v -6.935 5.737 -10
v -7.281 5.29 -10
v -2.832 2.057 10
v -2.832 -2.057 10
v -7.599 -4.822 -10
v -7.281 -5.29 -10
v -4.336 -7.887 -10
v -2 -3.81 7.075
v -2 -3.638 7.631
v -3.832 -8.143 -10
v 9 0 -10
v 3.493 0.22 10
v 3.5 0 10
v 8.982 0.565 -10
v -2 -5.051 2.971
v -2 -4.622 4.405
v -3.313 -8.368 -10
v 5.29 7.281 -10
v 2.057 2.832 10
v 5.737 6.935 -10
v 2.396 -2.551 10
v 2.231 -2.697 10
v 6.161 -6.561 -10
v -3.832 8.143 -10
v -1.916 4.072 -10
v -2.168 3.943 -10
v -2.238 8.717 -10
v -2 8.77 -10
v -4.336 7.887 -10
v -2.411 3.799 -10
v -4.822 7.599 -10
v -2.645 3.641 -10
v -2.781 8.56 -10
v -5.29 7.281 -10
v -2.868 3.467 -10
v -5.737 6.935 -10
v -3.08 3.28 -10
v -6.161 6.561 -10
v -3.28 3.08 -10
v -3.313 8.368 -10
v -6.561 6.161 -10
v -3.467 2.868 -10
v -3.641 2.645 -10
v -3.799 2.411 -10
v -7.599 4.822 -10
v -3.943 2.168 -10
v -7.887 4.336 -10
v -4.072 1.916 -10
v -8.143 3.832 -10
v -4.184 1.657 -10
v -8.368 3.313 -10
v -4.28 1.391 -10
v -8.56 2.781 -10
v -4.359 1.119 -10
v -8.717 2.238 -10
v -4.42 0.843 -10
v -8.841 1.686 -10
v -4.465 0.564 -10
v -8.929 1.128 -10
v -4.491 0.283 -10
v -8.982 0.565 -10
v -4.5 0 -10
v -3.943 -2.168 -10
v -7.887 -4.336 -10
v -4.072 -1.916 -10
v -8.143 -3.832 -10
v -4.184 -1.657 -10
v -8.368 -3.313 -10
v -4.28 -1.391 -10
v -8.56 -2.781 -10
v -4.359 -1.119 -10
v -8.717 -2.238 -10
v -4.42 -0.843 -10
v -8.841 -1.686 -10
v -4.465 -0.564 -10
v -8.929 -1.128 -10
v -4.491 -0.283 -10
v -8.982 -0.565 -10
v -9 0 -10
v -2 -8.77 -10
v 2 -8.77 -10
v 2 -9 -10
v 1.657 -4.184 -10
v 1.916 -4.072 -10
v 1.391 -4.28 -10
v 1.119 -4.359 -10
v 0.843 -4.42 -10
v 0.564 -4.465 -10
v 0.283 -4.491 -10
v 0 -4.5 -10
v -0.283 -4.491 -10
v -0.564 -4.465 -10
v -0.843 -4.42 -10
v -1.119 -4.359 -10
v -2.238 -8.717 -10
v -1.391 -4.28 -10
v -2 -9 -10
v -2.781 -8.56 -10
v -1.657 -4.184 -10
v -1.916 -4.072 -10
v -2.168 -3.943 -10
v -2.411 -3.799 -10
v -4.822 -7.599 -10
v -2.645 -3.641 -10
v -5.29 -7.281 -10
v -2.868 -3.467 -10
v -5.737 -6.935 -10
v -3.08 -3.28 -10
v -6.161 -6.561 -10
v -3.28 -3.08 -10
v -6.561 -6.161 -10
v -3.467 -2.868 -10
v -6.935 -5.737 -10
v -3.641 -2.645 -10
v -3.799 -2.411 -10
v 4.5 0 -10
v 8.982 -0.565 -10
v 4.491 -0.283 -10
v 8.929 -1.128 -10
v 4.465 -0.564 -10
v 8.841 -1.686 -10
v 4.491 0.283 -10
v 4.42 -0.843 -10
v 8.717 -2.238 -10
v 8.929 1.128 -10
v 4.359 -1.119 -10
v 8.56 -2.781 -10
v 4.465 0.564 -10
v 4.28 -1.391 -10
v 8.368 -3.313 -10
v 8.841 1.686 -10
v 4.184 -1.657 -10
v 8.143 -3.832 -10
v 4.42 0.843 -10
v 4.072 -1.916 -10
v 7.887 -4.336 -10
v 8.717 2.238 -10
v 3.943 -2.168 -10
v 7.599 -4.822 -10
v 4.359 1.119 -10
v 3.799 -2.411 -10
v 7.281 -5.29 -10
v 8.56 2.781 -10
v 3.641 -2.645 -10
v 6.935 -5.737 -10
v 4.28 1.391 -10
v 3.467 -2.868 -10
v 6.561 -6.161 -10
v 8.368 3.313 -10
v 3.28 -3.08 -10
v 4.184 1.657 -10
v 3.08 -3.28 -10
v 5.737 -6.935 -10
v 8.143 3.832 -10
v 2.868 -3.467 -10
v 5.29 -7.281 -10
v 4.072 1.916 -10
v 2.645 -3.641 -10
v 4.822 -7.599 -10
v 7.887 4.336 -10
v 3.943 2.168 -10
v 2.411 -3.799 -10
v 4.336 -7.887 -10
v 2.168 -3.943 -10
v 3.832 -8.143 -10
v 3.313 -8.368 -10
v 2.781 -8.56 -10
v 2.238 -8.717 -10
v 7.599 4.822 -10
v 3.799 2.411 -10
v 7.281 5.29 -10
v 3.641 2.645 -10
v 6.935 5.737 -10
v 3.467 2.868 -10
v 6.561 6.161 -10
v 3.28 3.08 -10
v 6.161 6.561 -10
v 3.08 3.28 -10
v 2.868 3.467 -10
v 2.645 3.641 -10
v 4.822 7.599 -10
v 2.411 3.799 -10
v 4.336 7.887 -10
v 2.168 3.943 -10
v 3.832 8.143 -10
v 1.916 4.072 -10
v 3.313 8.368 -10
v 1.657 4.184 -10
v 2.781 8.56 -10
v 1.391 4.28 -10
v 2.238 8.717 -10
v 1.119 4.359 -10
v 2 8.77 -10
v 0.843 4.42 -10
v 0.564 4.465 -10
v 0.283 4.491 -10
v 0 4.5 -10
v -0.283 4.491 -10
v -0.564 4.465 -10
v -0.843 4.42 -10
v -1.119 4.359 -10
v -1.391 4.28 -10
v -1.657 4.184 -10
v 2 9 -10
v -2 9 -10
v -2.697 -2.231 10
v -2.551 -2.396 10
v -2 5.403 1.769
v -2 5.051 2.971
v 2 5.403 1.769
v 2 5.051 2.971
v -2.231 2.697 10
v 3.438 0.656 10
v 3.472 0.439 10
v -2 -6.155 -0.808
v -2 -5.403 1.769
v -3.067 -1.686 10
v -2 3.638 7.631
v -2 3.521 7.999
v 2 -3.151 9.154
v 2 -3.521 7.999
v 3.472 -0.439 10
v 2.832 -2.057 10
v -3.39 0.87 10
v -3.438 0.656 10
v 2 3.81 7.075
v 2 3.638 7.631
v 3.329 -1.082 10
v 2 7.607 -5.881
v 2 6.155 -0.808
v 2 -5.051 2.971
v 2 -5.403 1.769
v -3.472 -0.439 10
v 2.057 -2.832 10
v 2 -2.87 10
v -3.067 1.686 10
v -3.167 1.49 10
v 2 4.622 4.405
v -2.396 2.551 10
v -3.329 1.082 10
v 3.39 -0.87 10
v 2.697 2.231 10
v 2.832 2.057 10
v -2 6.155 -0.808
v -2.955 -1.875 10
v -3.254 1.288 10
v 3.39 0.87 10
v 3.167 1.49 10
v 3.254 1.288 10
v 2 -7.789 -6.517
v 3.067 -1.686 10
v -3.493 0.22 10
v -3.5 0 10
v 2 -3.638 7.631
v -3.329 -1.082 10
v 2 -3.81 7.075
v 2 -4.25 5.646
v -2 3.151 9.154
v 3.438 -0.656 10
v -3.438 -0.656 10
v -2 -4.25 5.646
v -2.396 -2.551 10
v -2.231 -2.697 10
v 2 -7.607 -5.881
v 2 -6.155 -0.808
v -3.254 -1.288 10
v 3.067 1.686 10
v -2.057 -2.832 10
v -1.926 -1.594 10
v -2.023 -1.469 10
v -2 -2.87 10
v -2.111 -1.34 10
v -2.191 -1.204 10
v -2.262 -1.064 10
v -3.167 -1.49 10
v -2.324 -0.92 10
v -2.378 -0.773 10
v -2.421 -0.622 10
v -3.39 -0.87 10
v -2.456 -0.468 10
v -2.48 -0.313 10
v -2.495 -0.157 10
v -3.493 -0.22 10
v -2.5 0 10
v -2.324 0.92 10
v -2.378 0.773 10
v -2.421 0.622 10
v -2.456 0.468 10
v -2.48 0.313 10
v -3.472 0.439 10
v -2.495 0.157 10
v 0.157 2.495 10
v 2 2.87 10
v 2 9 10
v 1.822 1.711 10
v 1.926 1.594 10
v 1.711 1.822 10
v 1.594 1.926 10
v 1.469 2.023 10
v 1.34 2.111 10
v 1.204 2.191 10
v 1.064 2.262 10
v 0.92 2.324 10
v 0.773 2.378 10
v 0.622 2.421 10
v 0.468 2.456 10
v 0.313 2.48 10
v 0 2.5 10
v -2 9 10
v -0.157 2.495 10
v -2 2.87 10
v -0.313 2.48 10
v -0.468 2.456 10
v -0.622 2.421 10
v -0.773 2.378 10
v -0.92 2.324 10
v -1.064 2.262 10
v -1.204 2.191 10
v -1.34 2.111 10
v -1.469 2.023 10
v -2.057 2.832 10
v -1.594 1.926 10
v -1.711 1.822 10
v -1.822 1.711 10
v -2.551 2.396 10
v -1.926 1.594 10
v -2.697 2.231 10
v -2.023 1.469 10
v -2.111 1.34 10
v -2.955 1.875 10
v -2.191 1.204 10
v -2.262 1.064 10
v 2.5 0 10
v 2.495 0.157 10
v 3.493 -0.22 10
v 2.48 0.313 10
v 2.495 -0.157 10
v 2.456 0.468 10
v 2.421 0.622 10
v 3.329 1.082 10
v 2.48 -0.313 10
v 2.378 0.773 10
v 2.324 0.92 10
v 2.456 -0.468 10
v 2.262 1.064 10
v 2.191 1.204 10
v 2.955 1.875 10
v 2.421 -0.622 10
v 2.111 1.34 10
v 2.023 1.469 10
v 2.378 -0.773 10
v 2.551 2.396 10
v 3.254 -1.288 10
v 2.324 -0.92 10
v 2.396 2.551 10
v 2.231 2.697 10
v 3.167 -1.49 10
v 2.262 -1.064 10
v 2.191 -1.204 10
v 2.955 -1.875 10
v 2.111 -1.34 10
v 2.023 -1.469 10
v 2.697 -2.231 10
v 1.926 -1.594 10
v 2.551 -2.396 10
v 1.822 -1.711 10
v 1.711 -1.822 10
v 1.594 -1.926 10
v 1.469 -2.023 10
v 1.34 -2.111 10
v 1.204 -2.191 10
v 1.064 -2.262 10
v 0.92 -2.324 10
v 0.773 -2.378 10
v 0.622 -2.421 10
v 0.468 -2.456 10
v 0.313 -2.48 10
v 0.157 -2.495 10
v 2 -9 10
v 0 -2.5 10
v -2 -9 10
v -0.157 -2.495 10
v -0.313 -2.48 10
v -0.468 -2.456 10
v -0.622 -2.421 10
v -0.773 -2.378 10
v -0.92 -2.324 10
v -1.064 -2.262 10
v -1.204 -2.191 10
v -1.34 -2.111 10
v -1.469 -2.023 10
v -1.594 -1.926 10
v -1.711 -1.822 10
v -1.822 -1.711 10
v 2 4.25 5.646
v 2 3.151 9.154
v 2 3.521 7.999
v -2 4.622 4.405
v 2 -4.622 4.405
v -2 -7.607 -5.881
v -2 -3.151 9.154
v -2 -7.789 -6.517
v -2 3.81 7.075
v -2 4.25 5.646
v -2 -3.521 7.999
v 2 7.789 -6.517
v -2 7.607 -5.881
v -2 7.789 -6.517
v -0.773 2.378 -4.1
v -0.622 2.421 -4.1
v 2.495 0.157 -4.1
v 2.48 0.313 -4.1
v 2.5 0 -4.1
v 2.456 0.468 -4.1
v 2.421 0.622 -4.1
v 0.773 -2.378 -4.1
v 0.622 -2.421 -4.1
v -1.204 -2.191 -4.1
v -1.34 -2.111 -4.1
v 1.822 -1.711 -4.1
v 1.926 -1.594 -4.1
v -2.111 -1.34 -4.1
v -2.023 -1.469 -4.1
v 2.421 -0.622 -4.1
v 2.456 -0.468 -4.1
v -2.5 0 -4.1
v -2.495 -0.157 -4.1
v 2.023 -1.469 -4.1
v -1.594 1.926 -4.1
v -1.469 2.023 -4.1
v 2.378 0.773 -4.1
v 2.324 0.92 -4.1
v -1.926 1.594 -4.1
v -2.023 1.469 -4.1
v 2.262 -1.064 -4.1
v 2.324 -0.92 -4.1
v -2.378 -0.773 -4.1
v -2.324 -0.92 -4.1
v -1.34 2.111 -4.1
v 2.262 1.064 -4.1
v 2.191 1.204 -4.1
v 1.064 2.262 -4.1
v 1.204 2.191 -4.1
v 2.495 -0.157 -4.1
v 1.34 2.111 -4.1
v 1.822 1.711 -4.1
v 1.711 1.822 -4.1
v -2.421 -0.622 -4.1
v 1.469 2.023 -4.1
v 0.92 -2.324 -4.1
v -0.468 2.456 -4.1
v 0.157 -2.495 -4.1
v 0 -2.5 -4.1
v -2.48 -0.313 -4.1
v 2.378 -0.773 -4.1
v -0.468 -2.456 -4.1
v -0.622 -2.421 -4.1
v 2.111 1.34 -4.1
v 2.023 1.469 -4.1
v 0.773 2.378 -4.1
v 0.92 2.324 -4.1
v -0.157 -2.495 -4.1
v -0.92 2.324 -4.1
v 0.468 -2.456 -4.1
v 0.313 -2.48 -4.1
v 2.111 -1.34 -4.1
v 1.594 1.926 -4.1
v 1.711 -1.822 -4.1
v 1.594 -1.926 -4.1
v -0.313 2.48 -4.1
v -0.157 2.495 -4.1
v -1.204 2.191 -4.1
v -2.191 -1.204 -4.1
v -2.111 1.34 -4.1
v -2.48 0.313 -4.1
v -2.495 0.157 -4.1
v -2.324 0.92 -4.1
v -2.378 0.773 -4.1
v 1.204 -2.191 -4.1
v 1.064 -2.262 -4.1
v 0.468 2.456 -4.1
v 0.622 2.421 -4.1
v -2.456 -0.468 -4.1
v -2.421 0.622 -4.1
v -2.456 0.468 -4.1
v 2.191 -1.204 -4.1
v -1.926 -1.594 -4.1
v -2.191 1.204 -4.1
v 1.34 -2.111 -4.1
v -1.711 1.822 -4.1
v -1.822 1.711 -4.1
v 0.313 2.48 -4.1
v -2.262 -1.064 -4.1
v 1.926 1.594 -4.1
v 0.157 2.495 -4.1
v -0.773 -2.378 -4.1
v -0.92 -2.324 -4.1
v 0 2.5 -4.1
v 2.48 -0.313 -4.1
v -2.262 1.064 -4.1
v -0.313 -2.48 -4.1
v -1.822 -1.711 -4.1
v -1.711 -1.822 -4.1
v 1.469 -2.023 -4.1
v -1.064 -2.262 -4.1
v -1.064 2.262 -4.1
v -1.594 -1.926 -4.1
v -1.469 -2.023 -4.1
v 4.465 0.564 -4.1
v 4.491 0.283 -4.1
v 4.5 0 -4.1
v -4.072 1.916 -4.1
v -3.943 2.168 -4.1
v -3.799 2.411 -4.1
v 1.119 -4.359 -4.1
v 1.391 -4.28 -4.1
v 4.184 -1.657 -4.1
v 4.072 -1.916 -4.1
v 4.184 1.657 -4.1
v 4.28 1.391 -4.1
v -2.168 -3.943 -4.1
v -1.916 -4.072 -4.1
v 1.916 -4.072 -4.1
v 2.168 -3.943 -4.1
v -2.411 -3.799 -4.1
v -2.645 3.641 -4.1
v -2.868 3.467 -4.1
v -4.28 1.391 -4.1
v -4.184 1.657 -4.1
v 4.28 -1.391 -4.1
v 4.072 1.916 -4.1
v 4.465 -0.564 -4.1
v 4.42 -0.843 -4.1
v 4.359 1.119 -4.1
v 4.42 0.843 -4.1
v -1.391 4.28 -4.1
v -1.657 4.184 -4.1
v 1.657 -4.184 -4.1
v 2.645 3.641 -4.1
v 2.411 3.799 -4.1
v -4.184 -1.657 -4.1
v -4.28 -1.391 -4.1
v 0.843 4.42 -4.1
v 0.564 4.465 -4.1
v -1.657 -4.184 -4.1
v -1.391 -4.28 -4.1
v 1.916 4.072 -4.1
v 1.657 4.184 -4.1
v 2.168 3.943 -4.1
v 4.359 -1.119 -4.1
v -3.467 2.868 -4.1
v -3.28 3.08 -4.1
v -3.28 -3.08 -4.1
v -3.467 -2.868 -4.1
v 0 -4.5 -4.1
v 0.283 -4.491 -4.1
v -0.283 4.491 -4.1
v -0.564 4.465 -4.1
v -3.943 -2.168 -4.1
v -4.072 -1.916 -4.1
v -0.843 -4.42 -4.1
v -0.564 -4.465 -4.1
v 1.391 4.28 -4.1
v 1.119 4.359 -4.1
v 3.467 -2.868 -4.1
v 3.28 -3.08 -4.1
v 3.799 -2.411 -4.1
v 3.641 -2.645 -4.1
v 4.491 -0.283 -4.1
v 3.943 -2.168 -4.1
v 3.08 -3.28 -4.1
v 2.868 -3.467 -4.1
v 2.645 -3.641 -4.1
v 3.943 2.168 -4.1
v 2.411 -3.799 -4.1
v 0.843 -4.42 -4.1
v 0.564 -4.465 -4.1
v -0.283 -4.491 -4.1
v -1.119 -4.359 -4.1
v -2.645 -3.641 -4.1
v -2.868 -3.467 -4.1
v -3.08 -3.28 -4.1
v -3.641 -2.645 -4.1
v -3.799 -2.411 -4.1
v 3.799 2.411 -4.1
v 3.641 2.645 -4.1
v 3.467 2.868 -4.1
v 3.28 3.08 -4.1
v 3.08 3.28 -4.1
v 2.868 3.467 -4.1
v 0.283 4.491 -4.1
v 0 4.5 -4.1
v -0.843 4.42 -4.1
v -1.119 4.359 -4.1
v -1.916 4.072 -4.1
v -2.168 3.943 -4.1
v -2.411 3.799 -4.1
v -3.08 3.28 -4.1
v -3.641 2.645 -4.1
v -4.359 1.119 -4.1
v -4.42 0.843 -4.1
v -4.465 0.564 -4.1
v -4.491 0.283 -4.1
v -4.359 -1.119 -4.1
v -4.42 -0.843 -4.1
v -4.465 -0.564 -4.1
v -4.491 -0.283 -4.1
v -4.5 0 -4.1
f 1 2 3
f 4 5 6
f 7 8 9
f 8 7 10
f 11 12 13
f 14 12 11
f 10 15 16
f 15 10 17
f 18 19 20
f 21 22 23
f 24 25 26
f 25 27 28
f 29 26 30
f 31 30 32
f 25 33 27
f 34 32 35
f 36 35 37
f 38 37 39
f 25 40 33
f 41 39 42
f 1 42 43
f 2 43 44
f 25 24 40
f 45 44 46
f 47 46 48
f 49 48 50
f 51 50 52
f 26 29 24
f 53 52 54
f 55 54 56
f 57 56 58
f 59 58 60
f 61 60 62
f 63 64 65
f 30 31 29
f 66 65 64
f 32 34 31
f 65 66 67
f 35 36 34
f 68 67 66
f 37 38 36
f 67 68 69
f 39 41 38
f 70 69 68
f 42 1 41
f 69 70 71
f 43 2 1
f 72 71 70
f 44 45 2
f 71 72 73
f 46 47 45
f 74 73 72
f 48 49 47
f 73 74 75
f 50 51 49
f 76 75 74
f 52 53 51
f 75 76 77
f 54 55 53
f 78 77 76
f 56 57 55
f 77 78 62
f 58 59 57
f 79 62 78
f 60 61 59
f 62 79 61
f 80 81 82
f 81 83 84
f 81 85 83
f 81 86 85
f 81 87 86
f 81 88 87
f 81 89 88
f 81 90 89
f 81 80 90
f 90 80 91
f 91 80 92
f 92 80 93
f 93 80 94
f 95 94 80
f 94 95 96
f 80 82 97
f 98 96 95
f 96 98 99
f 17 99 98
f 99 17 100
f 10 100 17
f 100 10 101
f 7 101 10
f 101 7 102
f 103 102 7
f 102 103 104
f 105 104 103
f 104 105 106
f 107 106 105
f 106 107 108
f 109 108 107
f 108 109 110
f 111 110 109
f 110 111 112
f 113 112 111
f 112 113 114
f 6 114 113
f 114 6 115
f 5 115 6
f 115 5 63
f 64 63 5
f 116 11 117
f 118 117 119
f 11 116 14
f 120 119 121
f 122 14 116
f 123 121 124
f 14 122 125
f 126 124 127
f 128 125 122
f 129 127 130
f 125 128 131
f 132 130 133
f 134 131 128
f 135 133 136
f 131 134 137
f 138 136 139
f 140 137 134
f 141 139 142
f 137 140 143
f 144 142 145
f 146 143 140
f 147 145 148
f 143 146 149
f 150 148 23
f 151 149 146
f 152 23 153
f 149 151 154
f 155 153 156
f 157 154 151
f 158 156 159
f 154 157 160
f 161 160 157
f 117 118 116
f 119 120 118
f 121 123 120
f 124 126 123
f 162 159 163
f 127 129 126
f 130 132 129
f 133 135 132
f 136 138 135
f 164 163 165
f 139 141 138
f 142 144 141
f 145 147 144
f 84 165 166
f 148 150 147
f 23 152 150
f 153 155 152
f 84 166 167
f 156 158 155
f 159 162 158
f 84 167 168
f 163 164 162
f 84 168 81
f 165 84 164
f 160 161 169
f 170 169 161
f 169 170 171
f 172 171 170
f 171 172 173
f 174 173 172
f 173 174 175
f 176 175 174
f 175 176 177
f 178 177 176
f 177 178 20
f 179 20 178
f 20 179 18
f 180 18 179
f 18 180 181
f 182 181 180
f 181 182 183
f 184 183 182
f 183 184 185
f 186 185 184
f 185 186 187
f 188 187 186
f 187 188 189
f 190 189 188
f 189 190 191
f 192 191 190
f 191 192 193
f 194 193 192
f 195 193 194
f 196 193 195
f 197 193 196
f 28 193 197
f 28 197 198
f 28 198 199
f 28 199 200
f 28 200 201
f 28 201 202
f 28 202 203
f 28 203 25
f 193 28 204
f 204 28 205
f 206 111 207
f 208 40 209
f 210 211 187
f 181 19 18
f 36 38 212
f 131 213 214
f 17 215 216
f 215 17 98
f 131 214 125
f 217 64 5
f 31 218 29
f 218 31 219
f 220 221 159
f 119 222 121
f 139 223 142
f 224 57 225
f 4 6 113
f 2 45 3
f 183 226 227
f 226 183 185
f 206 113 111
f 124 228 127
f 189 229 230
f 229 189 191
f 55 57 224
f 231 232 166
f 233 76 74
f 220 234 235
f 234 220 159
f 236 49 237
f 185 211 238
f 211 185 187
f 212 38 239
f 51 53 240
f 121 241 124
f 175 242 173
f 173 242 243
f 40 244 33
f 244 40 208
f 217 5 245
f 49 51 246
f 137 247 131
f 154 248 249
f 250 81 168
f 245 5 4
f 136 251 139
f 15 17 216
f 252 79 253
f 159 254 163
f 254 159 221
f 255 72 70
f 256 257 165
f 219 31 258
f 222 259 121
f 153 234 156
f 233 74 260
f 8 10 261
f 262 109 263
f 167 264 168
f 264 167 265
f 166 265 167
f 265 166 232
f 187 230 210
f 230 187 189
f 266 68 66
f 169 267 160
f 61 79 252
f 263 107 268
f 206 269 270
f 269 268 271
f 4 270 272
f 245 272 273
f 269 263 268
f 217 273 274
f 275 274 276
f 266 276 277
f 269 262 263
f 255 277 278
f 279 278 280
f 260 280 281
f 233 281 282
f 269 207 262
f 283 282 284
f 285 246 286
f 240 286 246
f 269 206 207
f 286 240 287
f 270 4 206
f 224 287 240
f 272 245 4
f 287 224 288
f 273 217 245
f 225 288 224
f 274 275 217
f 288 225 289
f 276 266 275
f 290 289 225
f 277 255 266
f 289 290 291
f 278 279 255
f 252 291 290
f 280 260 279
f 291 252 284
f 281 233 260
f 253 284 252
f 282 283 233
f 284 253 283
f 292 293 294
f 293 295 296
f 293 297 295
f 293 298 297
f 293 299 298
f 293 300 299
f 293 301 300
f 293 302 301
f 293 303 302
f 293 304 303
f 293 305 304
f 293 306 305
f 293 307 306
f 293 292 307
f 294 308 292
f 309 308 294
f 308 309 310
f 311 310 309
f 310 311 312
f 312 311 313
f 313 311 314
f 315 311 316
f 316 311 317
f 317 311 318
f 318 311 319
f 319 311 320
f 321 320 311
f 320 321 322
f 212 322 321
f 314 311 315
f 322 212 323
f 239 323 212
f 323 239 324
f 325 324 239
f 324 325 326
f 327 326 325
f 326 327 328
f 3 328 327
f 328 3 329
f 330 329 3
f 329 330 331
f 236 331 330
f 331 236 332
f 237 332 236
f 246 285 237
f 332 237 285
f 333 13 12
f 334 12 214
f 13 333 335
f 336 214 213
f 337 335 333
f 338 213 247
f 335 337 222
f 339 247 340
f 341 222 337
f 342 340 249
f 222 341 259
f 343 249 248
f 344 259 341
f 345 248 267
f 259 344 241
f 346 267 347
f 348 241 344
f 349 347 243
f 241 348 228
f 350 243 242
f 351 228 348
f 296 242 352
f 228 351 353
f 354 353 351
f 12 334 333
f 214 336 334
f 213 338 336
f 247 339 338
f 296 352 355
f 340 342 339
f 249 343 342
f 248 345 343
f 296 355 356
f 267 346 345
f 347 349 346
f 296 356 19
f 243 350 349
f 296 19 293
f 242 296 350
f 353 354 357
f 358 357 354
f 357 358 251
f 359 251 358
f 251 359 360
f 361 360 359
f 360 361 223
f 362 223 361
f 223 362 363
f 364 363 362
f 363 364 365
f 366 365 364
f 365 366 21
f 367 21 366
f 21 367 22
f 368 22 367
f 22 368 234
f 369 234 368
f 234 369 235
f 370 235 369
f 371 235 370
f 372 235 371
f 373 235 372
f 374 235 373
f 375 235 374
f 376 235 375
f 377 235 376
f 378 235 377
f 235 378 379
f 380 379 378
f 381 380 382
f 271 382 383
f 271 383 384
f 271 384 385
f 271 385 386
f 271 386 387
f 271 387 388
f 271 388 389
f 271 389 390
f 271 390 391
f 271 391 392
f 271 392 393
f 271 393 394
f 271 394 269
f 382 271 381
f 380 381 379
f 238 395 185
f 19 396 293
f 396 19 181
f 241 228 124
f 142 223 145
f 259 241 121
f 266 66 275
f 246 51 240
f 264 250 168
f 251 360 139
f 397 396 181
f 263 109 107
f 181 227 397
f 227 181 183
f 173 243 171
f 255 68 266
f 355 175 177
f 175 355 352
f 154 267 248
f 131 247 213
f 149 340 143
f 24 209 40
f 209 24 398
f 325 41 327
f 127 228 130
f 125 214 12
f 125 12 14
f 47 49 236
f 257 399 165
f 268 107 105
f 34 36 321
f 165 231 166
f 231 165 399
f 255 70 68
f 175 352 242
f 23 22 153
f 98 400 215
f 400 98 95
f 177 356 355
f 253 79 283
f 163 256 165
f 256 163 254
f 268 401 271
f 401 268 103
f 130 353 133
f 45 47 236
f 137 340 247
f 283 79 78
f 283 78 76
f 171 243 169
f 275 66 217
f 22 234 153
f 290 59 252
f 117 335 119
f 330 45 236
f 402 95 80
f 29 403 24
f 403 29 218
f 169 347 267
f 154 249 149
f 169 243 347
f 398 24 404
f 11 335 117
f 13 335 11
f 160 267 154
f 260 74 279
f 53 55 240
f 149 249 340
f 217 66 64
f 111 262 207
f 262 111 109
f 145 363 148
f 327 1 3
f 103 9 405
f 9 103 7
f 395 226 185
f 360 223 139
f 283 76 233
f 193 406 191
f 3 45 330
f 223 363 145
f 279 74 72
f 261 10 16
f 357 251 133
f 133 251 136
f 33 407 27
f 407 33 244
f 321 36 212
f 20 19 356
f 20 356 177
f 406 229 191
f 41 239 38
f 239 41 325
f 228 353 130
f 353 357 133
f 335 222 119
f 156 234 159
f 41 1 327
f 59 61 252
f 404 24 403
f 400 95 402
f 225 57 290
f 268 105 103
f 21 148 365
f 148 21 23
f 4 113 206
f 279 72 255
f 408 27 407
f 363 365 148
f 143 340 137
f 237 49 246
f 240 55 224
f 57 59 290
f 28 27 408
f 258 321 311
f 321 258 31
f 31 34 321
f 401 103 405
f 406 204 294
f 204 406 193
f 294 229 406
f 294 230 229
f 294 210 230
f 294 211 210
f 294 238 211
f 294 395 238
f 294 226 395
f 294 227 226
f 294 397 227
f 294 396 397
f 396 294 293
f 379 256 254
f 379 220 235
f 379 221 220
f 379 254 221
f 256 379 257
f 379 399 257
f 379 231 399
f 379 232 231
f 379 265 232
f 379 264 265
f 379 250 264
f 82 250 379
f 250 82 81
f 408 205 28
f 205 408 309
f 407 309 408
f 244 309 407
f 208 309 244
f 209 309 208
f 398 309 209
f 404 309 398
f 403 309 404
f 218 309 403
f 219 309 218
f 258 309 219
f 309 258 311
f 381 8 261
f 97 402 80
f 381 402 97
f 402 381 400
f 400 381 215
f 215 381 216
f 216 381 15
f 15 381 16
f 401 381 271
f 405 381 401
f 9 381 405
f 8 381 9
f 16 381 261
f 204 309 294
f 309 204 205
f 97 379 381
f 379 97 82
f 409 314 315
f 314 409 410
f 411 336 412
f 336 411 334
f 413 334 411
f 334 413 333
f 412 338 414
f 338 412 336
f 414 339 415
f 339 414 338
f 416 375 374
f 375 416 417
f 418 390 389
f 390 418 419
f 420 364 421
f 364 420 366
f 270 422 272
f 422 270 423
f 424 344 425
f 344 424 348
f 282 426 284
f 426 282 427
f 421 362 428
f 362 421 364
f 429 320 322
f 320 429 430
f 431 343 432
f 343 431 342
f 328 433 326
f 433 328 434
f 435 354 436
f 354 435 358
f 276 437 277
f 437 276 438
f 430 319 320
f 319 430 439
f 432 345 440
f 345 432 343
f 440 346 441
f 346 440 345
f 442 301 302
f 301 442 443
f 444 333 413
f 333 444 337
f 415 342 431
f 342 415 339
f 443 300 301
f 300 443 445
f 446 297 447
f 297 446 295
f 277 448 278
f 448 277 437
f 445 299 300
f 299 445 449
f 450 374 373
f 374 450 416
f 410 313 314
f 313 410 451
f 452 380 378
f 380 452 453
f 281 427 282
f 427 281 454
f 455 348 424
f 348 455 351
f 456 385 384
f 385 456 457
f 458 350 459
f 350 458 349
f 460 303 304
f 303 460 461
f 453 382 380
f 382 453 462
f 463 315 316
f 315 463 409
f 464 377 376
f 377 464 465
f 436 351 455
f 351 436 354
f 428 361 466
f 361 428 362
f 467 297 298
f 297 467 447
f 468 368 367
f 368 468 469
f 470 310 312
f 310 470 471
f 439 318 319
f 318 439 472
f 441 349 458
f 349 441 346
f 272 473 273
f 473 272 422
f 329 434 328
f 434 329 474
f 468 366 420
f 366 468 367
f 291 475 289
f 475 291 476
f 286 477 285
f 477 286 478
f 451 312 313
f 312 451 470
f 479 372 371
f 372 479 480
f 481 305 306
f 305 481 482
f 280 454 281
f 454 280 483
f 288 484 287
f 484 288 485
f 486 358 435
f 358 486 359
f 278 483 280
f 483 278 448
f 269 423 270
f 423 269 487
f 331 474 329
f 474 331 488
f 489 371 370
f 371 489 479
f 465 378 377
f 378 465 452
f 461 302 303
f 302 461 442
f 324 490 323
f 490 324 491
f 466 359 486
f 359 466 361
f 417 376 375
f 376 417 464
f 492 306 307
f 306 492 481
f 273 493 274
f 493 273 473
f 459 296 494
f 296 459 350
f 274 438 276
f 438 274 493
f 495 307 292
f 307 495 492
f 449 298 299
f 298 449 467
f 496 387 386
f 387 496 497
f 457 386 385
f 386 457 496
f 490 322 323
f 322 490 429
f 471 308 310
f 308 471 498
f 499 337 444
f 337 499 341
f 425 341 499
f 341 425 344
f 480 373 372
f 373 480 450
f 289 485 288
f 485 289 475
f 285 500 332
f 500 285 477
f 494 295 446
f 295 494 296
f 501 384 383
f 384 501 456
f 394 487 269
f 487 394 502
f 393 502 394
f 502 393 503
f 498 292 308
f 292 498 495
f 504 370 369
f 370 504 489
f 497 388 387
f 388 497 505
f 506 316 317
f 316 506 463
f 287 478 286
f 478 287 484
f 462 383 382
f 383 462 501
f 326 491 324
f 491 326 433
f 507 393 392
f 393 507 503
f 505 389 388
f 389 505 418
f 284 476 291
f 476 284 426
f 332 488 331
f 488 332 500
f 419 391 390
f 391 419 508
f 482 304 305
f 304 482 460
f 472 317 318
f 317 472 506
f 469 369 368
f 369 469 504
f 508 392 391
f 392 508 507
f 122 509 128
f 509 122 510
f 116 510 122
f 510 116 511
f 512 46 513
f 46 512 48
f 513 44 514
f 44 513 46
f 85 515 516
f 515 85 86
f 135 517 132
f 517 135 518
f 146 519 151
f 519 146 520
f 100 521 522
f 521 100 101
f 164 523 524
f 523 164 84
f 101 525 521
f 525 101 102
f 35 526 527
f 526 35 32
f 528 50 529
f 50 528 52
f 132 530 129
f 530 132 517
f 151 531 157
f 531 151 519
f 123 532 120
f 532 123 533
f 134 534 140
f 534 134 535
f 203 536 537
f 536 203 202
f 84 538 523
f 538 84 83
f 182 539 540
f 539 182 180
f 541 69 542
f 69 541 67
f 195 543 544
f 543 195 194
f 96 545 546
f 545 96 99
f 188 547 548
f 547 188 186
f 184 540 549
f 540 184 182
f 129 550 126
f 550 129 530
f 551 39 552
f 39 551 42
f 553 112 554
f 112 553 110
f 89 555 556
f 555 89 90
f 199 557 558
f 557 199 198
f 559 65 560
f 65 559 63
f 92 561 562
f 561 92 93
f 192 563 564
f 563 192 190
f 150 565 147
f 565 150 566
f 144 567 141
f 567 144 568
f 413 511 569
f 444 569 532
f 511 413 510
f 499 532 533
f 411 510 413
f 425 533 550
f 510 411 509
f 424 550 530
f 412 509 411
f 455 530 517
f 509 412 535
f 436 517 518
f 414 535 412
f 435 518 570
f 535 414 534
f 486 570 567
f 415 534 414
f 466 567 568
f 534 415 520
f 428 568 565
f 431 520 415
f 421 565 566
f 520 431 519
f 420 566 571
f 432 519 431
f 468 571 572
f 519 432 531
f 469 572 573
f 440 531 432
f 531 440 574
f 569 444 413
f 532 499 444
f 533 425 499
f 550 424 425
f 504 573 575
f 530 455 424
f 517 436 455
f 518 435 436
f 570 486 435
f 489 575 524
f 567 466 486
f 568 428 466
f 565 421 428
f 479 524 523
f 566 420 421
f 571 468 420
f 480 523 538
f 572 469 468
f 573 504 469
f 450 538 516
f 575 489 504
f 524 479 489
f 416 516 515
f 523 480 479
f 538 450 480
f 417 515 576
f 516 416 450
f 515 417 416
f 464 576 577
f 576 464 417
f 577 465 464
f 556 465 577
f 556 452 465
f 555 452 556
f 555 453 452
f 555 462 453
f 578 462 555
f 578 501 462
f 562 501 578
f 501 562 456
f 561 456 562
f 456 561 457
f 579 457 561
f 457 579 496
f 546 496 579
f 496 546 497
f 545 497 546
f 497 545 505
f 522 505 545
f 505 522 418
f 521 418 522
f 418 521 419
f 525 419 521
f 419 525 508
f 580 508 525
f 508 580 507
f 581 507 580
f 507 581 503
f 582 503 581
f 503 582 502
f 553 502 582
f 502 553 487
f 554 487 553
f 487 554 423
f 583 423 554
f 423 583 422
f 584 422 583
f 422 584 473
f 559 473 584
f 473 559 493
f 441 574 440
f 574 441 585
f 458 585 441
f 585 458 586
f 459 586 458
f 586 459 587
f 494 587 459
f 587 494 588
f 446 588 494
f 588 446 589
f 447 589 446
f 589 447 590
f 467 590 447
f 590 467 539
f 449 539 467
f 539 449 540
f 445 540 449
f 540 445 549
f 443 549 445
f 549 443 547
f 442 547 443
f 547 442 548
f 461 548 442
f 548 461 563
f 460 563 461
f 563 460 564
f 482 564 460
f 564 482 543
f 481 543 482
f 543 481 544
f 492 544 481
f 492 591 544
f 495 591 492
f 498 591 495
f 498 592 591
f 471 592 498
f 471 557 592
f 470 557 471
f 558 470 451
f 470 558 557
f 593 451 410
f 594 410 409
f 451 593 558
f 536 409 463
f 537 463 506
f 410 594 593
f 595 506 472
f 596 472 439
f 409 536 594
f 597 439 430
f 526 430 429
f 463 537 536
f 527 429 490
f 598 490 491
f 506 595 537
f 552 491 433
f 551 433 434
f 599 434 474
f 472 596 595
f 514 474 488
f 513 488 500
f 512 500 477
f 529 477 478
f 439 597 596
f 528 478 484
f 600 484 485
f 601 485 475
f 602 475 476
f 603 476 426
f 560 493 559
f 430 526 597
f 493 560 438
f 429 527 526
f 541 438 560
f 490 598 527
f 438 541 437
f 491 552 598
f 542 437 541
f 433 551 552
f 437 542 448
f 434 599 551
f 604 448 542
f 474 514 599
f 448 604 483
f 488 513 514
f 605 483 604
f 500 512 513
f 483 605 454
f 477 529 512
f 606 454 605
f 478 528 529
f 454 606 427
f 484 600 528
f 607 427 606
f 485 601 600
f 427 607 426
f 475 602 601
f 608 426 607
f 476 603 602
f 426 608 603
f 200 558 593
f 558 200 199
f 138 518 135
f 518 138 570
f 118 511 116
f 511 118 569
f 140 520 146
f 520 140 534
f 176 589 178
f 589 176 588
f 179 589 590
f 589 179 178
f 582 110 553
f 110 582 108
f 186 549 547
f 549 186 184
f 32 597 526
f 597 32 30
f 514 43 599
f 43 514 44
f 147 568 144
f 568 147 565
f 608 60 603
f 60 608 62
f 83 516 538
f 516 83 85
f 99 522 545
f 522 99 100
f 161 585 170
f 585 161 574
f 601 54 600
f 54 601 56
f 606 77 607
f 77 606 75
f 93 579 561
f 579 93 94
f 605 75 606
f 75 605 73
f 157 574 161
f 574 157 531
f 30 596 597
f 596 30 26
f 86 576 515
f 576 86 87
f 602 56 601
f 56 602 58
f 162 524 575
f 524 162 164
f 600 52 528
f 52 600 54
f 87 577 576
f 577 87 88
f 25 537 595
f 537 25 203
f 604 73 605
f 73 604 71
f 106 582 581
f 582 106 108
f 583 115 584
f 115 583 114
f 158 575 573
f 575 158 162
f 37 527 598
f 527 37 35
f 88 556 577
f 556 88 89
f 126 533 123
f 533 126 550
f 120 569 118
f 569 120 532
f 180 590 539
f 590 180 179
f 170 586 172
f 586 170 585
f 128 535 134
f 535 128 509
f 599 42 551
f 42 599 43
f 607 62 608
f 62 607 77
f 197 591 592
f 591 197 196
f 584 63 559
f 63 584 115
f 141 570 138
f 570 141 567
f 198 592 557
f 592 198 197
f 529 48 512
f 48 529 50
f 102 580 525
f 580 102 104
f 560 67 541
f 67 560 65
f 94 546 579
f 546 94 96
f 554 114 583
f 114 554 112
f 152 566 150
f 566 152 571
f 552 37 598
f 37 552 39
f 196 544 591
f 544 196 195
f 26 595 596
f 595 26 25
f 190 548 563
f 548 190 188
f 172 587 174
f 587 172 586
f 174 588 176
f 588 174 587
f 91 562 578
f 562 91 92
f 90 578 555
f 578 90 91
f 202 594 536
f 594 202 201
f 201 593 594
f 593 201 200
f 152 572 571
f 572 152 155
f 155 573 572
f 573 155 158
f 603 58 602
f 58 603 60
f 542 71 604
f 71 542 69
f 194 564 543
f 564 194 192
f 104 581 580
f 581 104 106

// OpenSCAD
// --- parameters

$fn=100;
height = 20;
outerWidth = 18;
innerScrewWidth = 5;
minWidth = 1;
nutWidth = 9;
nutHeight = 6;

// ----
difference() {
    difference() {
        union() {
            cylinder(h=height, d1=outerWidth, d2=innerScrewWidth + minWidth * 2, center=true);
            cube([4, outerWidth, height], center=true);
        }
        cylinder(h=height + 2, d=innerScrewWidth, center=true);
    }
    translate([0, 0, -height / 2 + nutHeight / 2 - 0.1]) {
        cylinder(h=nutHeight, d=nutWidth, center=true);
    }
}
